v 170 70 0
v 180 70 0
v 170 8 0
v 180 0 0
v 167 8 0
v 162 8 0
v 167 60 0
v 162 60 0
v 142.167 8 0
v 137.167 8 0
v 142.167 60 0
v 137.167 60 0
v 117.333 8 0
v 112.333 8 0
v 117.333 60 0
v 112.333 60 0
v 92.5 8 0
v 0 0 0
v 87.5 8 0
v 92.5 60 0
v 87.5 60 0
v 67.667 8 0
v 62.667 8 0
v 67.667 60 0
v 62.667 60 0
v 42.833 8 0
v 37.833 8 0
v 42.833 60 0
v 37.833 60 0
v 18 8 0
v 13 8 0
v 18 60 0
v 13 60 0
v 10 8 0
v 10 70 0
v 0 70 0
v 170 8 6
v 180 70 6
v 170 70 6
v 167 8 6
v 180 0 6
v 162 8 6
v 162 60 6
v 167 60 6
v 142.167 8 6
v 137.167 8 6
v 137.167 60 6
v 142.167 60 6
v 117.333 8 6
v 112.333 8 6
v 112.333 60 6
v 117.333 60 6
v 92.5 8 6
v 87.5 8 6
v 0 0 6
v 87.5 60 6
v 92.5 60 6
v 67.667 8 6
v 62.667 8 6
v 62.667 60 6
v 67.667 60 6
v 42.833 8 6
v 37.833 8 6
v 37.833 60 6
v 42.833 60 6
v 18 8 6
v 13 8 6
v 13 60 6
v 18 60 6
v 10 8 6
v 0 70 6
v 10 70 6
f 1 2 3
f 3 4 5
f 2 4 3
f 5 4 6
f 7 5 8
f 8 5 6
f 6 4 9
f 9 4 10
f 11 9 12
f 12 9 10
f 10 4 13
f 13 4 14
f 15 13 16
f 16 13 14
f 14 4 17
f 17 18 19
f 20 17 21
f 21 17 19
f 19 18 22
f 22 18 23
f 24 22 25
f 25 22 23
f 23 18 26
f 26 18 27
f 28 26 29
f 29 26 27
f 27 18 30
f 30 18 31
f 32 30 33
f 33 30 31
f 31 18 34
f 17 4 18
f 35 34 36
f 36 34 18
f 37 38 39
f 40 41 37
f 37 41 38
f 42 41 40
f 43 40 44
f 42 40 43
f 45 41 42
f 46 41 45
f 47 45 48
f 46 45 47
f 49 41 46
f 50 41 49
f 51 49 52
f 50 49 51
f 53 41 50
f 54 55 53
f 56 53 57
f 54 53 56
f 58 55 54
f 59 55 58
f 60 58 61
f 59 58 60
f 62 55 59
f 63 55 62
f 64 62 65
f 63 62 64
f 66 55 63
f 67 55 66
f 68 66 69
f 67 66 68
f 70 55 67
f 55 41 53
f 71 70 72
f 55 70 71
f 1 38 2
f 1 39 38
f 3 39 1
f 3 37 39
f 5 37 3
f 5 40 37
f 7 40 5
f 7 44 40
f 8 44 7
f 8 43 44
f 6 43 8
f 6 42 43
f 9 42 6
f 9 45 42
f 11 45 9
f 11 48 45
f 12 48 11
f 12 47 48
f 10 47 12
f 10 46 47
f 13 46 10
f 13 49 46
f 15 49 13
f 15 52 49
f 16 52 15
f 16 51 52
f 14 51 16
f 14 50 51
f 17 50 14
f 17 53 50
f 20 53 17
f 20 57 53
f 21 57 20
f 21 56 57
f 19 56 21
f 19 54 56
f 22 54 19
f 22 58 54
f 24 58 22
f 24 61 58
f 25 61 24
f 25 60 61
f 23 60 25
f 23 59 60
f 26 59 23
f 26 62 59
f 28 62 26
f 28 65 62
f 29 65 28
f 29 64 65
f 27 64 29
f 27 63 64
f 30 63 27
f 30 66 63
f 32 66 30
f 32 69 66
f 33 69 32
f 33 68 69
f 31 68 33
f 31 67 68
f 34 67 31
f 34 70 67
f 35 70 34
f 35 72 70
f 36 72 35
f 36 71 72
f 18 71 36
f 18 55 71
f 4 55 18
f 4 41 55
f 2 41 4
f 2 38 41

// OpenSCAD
$fn = 32;

// ----------------------------------------------------------------------
// Guard grille: 7 slats over a 180 x 70 mm plate
// ----------------------------------------------------------------------

// --- parameters (mm) ---
profile_height = 6;       // extrusion height
profile_points = 36;      // points of the closed outline

profile = [[0, 0], [180, 0], [180, 70], [170, 70], [170, 8], [167, 8], [167, 60], [162, 60], [162, 8], [142.167, 8], [142.167, 60], [137.167, 60], [137.167, 8], [117.333, 8], [117.333, 60], [112.333, 60], [112.333, 8], [92.5, 8], [92.5, 60], [87.5, 60], [87.5, 8], [67.667, 8], [67.667, 60], [62.667, 60], [62.667, 8], [42.833, 8], [42.833, 60], [37.833, 60], [37.833, 8], [18, 8], [18, 60], [13, 60], [13, 8], [10, 8], [10, 70], [0, 70]];  // single closed polygon, 36 points, counter clockwise

// --- the one profile operation ---
linear_extrude(height = profile_height) polygon(points = profile);
